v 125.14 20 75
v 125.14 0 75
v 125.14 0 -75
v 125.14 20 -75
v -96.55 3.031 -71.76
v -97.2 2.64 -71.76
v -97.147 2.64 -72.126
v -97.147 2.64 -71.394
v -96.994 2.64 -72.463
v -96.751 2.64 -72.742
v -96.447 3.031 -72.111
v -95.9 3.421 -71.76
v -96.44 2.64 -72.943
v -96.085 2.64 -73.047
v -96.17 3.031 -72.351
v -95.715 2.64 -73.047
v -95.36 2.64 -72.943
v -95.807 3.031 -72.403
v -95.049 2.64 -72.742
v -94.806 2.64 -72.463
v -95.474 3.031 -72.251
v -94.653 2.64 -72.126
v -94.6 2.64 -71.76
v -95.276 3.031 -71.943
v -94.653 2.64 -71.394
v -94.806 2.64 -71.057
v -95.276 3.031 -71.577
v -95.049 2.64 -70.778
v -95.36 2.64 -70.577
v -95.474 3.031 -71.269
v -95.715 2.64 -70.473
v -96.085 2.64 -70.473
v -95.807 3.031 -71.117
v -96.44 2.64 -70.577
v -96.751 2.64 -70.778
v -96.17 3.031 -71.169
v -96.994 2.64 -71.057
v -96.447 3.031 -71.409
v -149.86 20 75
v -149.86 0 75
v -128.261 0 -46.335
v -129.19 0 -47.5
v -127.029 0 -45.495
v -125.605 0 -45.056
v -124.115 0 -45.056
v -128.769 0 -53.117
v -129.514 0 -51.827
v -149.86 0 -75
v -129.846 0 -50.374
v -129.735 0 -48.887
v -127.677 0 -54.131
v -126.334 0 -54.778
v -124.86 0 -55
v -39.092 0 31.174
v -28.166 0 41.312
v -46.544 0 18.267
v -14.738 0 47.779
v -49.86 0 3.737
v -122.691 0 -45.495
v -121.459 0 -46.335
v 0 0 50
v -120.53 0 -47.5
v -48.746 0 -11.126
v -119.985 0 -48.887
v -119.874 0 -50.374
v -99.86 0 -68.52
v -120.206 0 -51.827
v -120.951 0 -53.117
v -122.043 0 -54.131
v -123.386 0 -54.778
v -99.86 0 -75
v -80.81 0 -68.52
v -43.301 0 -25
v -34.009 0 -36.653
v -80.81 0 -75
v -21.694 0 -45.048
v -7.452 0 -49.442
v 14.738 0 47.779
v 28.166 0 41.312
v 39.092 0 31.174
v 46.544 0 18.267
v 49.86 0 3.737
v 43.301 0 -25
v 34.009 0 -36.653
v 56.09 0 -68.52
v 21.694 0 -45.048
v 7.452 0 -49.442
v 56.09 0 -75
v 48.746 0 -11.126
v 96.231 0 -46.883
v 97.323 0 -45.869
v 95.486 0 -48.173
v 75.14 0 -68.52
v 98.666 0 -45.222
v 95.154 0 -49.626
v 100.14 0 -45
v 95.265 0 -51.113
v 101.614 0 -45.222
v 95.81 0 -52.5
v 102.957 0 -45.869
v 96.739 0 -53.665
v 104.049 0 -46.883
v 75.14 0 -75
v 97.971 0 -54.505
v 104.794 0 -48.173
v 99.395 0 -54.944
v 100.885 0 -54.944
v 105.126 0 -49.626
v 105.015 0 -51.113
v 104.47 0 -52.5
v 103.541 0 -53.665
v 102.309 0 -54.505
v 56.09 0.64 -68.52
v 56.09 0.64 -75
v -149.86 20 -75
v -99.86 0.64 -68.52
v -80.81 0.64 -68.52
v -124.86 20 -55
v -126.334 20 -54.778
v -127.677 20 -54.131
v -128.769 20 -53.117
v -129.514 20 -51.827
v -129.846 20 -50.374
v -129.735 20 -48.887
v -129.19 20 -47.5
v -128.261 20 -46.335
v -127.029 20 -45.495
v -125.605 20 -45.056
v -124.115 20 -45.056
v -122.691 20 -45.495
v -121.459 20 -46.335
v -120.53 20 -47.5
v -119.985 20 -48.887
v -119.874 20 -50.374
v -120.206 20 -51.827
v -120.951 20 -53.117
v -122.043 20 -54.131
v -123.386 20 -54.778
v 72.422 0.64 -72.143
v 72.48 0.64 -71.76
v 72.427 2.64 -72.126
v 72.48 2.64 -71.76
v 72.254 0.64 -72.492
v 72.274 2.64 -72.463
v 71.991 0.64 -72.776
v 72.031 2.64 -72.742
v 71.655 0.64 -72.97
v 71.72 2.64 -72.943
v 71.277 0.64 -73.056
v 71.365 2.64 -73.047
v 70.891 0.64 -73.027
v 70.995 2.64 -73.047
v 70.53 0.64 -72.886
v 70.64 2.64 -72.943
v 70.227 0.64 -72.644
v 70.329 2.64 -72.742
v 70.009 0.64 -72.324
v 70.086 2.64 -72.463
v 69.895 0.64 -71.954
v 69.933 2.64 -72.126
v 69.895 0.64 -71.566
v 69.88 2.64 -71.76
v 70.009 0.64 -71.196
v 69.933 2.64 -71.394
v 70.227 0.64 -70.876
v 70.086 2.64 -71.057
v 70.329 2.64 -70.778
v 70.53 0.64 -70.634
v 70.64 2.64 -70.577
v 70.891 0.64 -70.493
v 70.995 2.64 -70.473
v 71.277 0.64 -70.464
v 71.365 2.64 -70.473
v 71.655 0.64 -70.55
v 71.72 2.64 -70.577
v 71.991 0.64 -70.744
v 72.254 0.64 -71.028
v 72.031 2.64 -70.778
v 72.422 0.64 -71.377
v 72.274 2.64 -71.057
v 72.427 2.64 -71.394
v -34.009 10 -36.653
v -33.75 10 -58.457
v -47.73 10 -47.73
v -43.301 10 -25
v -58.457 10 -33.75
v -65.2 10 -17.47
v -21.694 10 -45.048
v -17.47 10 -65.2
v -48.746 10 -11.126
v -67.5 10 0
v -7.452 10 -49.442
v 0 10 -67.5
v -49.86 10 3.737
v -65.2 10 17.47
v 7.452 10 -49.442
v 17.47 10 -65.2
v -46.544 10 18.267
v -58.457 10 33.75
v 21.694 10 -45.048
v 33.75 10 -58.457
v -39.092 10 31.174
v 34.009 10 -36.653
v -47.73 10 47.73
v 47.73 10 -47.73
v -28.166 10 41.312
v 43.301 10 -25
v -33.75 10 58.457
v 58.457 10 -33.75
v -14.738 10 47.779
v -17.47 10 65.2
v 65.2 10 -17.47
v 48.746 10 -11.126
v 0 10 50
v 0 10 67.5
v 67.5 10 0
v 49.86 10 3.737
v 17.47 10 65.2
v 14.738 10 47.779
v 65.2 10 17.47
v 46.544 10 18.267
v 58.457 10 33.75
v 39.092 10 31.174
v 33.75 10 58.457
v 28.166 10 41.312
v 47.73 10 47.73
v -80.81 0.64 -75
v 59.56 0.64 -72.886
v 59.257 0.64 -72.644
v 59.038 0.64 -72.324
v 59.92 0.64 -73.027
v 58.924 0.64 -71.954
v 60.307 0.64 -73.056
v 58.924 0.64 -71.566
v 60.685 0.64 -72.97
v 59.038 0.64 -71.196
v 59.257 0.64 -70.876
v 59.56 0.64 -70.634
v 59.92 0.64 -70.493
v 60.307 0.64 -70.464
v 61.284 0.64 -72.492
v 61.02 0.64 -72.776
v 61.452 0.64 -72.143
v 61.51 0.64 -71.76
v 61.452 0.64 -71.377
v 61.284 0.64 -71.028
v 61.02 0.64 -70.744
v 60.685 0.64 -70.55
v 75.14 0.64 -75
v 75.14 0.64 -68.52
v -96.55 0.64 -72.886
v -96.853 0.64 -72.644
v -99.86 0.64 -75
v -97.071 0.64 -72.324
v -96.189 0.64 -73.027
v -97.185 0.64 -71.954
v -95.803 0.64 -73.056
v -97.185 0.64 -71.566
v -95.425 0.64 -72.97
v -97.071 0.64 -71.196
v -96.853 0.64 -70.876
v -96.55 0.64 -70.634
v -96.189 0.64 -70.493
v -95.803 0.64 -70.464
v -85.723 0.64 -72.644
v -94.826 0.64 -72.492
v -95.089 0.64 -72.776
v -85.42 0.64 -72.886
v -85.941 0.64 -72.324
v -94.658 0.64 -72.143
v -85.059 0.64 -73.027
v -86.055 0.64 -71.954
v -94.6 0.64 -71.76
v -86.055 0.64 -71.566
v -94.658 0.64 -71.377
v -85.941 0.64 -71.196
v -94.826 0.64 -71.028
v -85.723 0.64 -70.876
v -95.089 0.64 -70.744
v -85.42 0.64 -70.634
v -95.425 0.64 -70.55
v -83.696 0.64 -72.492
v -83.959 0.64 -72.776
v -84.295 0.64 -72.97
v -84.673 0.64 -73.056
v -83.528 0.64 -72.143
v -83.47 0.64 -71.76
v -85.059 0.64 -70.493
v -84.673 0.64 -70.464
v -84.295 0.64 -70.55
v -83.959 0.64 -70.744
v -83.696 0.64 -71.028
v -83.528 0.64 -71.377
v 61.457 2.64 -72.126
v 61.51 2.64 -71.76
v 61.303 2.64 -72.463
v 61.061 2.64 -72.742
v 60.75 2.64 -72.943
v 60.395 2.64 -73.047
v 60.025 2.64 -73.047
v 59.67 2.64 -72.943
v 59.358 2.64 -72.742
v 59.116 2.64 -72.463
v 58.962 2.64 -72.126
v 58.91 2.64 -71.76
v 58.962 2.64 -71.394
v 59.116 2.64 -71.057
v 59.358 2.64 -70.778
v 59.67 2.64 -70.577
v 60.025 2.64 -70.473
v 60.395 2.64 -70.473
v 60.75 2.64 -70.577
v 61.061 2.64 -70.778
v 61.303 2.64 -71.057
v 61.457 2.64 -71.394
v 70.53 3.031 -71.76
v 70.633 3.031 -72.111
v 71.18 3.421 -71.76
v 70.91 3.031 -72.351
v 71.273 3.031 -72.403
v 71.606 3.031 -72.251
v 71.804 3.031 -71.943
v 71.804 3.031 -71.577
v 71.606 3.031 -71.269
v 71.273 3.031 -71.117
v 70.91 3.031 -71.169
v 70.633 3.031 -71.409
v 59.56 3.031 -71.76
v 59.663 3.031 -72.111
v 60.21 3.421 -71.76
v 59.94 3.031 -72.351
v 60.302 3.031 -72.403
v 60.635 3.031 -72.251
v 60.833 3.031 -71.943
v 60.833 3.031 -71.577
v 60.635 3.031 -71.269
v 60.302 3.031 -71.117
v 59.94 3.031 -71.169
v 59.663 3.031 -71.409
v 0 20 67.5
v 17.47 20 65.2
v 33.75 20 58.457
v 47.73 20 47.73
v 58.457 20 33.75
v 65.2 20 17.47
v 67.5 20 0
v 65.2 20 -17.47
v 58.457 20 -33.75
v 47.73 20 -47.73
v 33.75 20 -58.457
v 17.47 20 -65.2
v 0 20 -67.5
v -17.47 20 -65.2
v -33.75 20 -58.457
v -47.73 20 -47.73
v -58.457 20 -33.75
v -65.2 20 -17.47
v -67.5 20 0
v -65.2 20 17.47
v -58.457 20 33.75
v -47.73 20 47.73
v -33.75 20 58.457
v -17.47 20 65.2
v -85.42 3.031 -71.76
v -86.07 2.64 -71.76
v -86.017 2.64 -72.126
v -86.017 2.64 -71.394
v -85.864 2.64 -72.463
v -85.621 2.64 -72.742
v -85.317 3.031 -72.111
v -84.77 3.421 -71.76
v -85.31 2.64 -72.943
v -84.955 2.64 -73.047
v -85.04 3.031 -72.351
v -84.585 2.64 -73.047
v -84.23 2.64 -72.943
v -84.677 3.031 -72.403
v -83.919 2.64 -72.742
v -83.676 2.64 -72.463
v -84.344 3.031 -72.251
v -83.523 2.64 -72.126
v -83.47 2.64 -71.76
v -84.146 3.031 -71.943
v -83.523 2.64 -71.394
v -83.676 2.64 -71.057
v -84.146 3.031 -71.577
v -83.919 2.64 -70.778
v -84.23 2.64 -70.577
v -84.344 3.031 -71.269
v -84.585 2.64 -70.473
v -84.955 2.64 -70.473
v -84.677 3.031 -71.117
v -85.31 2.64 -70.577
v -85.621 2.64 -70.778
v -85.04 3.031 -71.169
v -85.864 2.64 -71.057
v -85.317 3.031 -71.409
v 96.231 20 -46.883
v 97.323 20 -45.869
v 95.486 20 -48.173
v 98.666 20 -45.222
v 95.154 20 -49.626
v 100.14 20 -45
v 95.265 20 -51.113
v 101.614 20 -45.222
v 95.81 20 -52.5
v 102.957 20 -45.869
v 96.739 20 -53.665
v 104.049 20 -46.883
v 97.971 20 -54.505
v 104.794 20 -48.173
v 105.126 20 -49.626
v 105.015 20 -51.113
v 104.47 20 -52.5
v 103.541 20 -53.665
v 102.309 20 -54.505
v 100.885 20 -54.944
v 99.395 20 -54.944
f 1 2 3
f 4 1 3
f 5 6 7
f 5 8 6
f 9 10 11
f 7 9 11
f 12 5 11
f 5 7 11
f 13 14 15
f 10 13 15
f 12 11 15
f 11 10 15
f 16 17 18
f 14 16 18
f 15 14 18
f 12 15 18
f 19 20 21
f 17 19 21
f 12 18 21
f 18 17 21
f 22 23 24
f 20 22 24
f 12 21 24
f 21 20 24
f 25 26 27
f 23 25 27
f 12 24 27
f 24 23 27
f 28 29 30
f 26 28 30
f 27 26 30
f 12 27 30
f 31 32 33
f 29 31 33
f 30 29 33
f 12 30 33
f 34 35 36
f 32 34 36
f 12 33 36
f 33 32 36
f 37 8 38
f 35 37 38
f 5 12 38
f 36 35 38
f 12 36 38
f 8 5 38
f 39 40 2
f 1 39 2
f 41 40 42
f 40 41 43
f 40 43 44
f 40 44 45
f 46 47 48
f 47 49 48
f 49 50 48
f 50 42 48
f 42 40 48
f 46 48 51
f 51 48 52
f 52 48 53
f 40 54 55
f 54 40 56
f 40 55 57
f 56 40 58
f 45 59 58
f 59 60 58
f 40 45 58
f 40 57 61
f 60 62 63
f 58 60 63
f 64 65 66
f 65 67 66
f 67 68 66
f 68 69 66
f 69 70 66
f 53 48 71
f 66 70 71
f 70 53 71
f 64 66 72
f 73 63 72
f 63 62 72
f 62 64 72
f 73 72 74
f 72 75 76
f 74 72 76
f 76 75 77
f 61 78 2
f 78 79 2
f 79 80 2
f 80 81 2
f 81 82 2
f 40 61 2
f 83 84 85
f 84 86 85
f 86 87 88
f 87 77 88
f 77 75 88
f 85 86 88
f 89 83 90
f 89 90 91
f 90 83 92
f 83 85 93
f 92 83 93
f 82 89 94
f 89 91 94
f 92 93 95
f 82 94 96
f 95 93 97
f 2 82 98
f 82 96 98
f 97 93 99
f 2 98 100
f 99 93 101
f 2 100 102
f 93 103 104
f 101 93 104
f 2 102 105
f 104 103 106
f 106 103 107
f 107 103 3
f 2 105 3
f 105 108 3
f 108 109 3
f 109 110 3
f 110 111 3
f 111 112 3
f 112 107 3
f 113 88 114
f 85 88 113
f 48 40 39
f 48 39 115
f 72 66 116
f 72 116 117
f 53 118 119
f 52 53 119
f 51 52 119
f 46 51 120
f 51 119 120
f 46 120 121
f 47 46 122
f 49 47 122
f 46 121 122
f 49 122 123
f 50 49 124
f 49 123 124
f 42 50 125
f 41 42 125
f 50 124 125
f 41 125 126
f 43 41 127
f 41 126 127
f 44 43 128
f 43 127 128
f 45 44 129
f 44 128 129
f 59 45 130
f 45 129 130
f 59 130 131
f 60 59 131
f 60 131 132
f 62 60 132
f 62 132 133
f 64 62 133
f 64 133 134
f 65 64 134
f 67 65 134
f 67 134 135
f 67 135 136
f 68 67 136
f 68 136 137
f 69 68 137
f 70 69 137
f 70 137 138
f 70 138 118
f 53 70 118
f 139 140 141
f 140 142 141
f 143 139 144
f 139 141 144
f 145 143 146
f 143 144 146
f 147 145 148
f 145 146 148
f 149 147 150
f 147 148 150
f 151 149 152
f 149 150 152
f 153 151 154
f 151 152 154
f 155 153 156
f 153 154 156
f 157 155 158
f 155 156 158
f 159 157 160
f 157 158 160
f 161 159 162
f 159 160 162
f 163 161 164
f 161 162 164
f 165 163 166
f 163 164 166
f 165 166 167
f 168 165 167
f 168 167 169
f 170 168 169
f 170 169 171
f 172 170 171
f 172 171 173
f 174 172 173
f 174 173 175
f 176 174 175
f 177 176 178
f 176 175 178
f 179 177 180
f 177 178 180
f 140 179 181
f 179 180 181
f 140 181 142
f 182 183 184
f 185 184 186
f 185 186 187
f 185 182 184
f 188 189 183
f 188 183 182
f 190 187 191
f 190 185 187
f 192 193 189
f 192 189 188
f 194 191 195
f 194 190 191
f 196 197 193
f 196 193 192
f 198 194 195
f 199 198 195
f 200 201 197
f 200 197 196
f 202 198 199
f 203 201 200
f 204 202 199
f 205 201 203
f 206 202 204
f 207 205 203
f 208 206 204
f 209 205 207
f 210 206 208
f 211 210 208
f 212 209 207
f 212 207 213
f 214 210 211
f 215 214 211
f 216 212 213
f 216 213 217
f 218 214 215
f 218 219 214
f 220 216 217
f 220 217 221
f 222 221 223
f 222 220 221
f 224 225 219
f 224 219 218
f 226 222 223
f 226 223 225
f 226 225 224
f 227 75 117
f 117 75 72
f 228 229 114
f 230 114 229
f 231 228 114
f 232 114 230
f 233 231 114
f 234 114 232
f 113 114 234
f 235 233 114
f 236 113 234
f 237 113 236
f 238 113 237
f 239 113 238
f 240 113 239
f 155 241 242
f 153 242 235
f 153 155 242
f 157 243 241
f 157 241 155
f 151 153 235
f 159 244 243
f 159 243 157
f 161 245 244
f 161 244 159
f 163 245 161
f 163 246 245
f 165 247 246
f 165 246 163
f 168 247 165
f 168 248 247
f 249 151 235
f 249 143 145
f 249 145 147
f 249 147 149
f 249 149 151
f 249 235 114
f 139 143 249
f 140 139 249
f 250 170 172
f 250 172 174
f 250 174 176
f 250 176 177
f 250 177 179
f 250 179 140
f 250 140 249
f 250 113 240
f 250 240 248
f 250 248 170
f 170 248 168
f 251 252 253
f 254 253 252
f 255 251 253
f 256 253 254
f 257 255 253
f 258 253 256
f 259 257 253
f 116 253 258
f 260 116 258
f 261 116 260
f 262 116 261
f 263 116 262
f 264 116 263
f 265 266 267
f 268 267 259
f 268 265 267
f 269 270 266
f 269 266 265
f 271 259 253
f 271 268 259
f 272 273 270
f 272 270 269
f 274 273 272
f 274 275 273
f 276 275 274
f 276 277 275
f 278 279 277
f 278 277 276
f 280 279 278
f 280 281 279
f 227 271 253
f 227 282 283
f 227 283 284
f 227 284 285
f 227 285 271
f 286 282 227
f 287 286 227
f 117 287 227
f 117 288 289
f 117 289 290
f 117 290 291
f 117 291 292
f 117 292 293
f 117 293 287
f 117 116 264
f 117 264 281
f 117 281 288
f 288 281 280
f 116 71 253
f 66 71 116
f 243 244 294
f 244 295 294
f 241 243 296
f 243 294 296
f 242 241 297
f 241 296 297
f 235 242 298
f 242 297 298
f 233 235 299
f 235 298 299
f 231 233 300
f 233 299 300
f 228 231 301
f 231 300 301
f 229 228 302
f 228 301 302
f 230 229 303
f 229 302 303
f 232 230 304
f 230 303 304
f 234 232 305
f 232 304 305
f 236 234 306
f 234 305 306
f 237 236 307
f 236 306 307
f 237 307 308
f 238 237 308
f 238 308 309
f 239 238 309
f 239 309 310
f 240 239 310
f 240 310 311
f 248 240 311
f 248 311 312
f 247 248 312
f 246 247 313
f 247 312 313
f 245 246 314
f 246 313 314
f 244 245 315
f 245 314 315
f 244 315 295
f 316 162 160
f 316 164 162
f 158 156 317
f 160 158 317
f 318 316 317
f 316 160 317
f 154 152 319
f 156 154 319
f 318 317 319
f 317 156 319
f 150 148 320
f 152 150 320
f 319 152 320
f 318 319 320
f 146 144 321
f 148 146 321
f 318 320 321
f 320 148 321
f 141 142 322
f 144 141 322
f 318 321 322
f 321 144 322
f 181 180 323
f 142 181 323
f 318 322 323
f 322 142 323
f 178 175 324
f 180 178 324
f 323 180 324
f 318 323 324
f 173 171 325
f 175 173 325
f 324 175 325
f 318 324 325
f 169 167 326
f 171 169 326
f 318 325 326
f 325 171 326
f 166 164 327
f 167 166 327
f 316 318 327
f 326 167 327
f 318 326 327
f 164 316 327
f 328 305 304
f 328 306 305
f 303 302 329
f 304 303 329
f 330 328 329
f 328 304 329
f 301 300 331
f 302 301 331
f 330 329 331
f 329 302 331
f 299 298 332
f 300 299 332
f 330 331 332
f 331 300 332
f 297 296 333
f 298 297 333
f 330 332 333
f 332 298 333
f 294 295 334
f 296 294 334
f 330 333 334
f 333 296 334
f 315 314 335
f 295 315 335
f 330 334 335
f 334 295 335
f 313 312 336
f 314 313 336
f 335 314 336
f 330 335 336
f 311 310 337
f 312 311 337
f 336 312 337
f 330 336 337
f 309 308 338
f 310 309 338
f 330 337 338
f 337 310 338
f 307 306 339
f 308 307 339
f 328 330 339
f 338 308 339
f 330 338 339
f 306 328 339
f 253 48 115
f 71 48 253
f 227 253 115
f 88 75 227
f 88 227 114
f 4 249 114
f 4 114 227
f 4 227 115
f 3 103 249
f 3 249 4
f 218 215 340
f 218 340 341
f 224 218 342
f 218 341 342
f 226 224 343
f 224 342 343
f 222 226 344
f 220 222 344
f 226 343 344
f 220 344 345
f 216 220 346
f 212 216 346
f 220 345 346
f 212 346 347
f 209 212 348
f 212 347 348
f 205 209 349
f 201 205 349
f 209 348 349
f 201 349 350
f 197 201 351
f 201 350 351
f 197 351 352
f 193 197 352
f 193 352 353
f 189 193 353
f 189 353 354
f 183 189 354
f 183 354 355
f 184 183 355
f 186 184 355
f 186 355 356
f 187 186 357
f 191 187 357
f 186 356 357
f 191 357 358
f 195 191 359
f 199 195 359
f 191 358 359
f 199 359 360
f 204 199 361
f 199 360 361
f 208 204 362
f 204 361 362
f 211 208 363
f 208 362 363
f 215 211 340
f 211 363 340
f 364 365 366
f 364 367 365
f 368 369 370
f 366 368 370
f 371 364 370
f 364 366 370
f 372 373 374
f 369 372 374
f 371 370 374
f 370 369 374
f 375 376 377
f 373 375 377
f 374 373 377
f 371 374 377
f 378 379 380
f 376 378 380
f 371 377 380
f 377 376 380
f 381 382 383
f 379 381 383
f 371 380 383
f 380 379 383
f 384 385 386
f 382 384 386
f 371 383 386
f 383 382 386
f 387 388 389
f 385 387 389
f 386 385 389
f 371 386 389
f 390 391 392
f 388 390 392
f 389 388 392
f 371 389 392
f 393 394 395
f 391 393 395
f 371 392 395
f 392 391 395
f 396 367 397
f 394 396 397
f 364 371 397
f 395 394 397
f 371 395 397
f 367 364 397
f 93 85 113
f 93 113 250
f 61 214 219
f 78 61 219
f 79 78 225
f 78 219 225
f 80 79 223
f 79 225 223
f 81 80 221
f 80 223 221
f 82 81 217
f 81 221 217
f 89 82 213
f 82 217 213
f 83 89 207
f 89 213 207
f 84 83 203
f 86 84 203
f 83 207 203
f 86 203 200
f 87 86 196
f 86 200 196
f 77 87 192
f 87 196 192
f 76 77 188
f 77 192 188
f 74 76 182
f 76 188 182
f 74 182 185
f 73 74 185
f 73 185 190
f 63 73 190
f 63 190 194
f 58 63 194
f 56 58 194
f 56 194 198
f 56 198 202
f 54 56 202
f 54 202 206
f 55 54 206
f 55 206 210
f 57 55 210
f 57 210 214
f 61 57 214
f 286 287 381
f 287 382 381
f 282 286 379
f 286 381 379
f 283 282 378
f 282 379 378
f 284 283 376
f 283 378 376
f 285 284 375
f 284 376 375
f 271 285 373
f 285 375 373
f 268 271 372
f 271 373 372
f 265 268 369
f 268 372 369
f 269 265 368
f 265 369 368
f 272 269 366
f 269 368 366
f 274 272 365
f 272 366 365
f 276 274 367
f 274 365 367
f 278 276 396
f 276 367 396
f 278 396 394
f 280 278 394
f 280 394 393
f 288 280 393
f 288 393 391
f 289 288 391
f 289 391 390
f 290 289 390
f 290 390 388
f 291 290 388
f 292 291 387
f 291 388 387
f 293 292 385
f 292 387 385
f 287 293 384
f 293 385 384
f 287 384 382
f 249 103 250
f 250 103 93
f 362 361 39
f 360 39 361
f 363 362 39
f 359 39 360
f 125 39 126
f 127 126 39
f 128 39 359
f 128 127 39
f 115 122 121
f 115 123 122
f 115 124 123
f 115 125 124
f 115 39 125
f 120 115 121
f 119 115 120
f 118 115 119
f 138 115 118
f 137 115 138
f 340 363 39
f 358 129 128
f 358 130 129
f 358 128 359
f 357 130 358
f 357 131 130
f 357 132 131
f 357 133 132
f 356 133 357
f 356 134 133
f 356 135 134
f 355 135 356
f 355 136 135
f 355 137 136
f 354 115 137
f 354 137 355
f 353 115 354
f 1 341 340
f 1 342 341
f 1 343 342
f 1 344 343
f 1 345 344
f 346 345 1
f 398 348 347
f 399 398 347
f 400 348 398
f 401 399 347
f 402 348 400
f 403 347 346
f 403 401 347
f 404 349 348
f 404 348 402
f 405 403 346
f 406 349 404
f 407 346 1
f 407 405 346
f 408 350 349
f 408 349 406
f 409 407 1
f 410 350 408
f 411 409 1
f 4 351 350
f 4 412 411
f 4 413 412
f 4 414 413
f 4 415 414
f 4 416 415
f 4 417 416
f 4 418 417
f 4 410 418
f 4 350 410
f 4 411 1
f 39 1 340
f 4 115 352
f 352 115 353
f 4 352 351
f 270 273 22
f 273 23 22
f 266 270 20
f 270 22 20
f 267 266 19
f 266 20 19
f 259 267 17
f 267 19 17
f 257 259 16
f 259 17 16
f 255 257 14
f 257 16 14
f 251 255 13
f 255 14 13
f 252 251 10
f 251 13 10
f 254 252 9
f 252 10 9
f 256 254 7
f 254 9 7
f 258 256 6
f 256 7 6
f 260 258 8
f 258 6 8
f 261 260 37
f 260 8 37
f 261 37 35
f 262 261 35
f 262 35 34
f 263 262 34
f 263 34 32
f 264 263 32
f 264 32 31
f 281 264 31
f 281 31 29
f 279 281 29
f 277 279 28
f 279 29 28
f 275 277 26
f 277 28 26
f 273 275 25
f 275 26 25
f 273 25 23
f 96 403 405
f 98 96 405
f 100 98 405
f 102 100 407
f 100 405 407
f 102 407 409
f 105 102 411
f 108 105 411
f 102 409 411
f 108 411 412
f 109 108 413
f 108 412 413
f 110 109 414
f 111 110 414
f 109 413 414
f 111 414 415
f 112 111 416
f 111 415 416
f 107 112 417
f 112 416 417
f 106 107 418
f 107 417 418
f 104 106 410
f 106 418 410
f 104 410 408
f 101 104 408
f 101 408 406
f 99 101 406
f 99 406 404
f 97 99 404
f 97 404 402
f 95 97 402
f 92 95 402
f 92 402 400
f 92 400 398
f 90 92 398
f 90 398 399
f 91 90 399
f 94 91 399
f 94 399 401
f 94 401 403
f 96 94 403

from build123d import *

# Parameters (mm, degrees)
SKETCH1_W                = 275
SKETCH1_H                = 150
SKETCH1_R                = 5
BOSS_EXTRUDE1_DEPTH      = 20
SKETCH2_R                = 50
CUT_EXTRUDE1_DEPTH       = 169.769131064
SKETCH3_R                = 67.5
CUT_EXTRUDE2_DEPTH       = 10
SKETCH4_R                = 5
CUT_EXTRUDE3_DEPTH       = 169.769131064
SKETCH5_W                = 19.05
SKETCH5_H                = 6.48
CUT_EXTRUDE4_DEPTH       = 0.64
M2_CLEARANCE_HOLE1_D     = 2.6
M2_CLEARANCE_HOLE1_DEPTH = 2
M2_CLEARANCE_HOLE1_TIP   = 0.781118805


with BuildPart() as part:
    # Sketch1 → Boss-Extrude1 (new body)
    with BuildSketch(Plane(origin=(0, 0, 0), x_dir=(1, 0, 0), z_dir=(0, 1, 0))):
        with Locations((-12.36, 0)):
            Rectangle(SKETCH1_W, SKETCH1_H)
        with Locations(Location((0, 0, 0), (0, 0, 270))):
            Circle(SKETCH1_R, mode=Mode.SUBTRACT)
    extrude(amount=BOSS_EXTRUDE1_DEPTH)

    # Sketch2 → Cut-Extrude1 (cut, through all)
    with BuildSketch(Plane(origin=(0, 20, 0), x_dir=(1, 0, 0), z_dir=(0, 1, 0))):
        with Locations(Location((0, 0, 0), (0, 0, 270))):
            Circle(SKETCH2_R)
    extrude(amount=-CUT_EXTRUDE1_DEPTH, mode=Mode.SUBTRACT)

    # Sketch3 → Cut-Extrude2 (cut)
    with BuildSketch(Plane(origin=(0, 20, 0), x_dir=(1, 0, 0), z_dir=(0, 1, 0))):
        with Locations(Location((0, 0, 0), (0, 0, 270))):
            Circle(SKETCH3_R)
    extrude(amount=-CUT_EXTRUDE2_DEPTH, mode=Mode.SUBTRACT)

    # Sketch4 → Cut-Extrude3 (cut, through all)
    with BuildSketch(Plane(origin=(0, 20, 0), x_dir=(1, 0, 0), z_dir=(0, 1, 0))):
        with Locations(Location((100.14, 50, 0), (0, 0, 270))):
            Circle(SKETCH4_R)
        with Locations(Location((-124.86, 50, 0), (0, 0, 90))):
            Circle(SKETCH4_R)
    extrude(amount=-CUT_EXTRUDE3_DEPTH, mode=Mode.SUBTRACT)

    # Sketch5 → Cut-Extrude4 (cut)
    with BuildSketch(Plane.XZ):
        with Locations((-90.335, -71.76)):
            Rectangle(SKETCH5_W, SKETCH5_H)
        with Locations((65.615, -71.76)):
            Rectangle(SKETCH5_W, SKETCH5_H)
    extrude(amount=-CUT_EXTRUDE4_DEPTH, mode=Mode.SUBTRACT)

    # M2 Clearance Hole1
    with Locations(Plane(origin=(0, 0.64, 0), x_dir=(-1, 0, 0), z_dir=(0, -1, 0))):
        with Locations((95.9, 71.76), (84.77, 71.76), (-71.18, 71.76), (-60.20961626, 71.76)):
            Hole(M2_CLEARANCE_HOLE1_D / 2, depth=M2_CLEARANCE_HOLE1_DEPTH)
            with Locations((0, 0, -(M2_CLEARANCE_HOLE1_DEPTH + M2_CLEARANCE_HOLE1_TIP / 2))):  # 118° drill point
                Cone(0, M2_CLEARANCE_HOLE1_D / 2, M2_CLEARANCE_HOLE1_TIP, mode=Mode.SUBTRACT)


solid = part.part
